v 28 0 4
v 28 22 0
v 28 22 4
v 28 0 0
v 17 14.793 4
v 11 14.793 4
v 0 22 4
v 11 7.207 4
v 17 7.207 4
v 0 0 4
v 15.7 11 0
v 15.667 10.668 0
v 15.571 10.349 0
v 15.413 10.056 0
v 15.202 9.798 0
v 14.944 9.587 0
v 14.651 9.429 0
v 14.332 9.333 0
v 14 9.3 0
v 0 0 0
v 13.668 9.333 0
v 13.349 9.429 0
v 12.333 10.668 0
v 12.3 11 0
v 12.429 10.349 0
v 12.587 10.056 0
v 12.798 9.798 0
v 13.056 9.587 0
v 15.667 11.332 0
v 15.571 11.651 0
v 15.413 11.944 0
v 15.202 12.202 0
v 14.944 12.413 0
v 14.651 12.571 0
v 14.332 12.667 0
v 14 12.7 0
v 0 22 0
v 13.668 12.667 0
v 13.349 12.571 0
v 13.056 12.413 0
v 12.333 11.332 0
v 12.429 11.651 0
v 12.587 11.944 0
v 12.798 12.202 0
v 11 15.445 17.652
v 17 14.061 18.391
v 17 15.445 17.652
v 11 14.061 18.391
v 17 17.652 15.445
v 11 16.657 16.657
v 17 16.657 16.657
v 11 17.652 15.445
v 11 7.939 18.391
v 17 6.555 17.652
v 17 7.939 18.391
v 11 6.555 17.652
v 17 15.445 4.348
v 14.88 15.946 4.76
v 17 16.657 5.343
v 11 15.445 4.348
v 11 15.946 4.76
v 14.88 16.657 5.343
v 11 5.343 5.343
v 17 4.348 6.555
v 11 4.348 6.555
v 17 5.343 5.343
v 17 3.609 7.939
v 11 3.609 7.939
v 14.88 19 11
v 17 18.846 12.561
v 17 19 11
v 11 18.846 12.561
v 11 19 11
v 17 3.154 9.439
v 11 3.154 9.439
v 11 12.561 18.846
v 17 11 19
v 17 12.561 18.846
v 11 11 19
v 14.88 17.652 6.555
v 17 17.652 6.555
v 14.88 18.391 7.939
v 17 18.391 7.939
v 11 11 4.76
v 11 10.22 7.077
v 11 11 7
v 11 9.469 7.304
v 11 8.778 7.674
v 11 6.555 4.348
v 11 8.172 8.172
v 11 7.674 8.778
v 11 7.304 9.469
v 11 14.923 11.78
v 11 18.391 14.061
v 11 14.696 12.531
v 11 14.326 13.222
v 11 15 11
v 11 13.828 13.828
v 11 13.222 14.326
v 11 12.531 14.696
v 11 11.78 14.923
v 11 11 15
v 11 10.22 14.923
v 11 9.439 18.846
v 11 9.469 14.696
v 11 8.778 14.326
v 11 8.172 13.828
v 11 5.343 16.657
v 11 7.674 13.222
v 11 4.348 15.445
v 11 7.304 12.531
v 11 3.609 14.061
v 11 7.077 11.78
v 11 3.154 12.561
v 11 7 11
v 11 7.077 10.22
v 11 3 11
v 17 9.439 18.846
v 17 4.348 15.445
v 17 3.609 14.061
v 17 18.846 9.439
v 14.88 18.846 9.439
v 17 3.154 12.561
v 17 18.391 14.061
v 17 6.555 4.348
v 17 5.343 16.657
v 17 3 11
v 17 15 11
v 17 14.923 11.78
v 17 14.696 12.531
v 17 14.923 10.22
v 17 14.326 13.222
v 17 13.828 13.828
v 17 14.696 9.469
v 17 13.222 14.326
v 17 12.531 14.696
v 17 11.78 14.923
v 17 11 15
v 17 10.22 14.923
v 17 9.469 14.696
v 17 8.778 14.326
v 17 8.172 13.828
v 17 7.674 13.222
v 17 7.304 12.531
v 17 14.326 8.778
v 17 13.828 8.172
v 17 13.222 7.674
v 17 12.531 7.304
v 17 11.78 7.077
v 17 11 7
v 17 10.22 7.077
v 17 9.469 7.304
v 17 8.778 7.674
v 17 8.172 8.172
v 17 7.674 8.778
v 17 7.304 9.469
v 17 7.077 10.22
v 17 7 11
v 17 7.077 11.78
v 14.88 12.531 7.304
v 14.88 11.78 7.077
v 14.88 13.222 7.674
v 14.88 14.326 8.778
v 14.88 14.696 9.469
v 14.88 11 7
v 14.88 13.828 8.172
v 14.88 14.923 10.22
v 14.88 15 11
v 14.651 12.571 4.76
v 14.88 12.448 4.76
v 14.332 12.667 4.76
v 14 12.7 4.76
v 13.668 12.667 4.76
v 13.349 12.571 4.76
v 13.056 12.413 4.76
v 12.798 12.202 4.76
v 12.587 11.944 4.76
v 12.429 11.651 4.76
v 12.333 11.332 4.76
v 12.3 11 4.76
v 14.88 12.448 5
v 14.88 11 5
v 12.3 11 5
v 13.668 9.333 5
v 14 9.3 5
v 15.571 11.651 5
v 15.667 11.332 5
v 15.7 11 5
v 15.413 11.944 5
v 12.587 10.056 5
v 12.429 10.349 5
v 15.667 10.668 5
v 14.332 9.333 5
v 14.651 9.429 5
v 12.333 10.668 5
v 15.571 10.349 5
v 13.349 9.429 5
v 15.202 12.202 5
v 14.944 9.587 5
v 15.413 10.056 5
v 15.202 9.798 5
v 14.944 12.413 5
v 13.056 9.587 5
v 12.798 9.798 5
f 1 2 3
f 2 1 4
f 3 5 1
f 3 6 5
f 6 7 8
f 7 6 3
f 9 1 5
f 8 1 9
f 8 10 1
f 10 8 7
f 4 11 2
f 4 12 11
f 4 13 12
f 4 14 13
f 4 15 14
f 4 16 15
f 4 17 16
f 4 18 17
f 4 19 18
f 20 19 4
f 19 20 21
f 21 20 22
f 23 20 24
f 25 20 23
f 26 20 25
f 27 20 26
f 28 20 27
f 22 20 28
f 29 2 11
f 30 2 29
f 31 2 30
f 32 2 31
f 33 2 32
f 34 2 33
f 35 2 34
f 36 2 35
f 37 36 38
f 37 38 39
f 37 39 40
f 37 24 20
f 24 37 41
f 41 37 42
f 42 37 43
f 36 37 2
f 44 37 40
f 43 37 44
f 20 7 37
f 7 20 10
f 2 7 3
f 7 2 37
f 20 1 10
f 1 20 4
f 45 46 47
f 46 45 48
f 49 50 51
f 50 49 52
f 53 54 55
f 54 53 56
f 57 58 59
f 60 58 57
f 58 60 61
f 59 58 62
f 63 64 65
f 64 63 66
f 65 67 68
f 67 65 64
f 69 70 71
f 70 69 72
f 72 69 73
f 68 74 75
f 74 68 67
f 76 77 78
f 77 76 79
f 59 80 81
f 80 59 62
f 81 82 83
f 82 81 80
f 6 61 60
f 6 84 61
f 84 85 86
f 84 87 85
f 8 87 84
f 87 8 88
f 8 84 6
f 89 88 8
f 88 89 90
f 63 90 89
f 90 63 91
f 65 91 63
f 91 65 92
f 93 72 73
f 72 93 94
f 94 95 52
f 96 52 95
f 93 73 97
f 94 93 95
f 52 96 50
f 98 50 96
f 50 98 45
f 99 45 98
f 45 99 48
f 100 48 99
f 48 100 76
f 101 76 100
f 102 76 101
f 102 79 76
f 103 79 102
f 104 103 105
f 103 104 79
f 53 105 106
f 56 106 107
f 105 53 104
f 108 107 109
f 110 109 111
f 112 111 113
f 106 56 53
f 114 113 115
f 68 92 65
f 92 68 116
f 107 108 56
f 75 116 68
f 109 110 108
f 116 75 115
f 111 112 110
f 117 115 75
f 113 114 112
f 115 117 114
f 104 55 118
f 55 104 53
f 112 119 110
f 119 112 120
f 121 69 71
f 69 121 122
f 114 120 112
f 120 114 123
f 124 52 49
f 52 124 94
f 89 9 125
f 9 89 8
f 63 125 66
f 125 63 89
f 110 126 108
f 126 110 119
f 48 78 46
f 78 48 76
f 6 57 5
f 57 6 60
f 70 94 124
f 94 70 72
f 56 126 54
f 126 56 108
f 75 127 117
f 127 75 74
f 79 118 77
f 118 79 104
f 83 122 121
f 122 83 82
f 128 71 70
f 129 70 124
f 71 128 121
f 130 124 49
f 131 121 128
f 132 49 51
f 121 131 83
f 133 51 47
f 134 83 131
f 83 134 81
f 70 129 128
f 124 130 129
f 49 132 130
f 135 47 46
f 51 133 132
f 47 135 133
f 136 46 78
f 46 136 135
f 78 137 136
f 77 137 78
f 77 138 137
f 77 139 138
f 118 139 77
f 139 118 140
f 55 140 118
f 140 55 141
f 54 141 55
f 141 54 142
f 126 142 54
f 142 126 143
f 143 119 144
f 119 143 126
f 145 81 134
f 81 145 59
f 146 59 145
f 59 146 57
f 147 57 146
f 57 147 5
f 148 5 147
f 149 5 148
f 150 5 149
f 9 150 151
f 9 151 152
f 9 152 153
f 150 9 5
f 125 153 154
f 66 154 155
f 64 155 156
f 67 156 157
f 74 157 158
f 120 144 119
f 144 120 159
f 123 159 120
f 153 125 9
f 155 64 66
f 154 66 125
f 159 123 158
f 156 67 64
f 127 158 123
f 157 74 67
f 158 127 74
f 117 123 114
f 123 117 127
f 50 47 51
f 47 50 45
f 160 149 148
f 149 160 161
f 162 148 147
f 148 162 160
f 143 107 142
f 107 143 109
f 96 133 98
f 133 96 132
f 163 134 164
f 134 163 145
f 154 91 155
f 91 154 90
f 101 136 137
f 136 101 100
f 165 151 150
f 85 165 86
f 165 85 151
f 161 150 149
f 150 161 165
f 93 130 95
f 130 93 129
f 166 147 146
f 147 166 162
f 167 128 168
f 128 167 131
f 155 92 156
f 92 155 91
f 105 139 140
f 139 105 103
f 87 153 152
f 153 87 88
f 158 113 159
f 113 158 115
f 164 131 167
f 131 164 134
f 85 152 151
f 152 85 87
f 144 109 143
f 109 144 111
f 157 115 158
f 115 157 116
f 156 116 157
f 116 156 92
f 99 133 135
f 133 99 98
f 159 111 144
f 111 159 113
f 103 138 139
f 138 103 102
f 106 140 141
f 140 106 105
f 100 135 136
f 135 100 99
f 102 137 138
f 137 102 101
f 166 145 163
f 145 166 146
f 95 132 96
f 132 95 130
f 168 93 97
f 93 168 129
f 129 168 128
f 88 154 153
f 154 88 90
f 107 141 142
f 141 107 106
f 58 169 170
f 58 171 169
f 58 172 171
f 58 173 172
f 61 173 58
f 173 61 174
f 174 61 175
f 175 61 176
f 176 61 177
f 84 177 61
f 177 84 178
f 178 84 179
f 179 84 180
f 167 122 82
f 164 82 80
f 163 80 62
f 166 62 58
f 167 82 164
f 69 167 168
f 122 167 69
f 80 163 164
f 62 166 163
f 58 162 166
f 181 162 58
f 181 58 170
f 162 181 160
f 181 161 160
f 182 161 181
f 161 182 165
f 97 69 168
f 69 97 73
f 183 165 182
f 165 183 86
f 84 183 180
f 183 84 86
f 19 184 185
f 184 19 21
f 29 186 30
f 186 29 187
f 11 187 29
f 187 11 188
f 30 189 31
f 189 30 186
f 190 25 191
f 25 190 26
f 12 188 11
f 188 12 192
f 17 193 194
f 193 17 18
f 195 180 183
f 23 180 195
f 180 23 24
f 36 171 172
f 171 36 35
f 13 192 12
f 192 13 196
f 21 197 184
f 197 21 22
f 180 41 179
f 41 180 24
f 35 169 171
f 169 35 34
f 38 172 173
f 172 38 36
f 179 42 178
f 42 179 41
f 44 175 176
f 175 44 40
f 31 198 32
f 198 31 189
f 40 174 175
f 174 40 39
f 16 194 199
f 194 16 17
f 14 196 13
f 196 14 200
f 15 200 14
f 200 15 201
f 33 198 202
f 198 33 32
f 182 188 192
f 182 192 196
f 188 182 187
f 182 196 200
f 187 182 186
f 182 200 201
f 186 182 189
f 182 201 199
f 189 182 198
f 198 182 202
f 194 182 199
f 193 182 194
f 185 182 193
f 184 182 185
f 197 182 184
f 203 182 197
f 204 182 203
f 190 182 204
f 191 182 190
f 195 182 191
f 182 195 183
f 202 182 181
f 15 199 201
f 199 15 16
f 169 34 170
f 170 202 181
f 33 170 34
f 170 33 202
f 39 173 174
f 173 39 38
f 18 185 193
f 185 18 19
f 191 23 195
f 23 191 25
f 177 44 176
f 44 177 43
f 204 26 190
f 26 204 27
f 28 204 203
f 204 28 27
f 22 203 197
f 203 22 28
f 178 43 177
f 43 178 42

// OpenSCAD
$fn = 32;

// ----------------------------------------------------------------------
// Cable clip: cable 8 mm, clamp 16 mm, base 28 mm
// ----------------------------------------------------------------------

// --- parameters (mm) ---
base_w = 28;              // base length, X
base_d = 22;              // base width, Y
base_t = 4;               // base thickness
clamp_d = 16;             // clamp outside diameter
wall_t = 4;               // clamp wall
cable_d = 8;              // cable opening
ring_w = 6;               // clamp width along the cable
screw_d = 3.4;            // screw clearance
throat = 6.24;            // snap throat width
sink = 1;                 // overlap of the clamp into the base

module base() {
  cube([base_w, base_d, base_t]);
}

module clamp() {
  translate([base_w / 2, base_d / 2, base_t + clamp_d / 2 - sink]) rotate([0, 90, 0])
    cylinder(h = ring_w, d = clamp_d, center = true);
}

difference() {
  union() {
    base();
    clamp();
  }
  translate([base_w / 2, base_d / 2, base_t + clamp_d / 2 - sink]) rotate([0, 90, 0]) translate([0, 0, -ring_w / 2 - 1]) cylinder(h = ring_w + 2, d = cable_d);
  /* snap throat: the opening is narrower than the cable */
  translate([base_w / 2 - throat / 2, base_d / 2, base_t + clamp_d / 2 - sink]) rotate([0, 90, 0]) translate([0, 0, -ring_w / 2 - 1]) cube([throat, clamp_d + 2, ring_w + 2]);
  translate([14, base_d / 2, -1]) cylinder(h = base_t + 2, d = screw_d);
}
